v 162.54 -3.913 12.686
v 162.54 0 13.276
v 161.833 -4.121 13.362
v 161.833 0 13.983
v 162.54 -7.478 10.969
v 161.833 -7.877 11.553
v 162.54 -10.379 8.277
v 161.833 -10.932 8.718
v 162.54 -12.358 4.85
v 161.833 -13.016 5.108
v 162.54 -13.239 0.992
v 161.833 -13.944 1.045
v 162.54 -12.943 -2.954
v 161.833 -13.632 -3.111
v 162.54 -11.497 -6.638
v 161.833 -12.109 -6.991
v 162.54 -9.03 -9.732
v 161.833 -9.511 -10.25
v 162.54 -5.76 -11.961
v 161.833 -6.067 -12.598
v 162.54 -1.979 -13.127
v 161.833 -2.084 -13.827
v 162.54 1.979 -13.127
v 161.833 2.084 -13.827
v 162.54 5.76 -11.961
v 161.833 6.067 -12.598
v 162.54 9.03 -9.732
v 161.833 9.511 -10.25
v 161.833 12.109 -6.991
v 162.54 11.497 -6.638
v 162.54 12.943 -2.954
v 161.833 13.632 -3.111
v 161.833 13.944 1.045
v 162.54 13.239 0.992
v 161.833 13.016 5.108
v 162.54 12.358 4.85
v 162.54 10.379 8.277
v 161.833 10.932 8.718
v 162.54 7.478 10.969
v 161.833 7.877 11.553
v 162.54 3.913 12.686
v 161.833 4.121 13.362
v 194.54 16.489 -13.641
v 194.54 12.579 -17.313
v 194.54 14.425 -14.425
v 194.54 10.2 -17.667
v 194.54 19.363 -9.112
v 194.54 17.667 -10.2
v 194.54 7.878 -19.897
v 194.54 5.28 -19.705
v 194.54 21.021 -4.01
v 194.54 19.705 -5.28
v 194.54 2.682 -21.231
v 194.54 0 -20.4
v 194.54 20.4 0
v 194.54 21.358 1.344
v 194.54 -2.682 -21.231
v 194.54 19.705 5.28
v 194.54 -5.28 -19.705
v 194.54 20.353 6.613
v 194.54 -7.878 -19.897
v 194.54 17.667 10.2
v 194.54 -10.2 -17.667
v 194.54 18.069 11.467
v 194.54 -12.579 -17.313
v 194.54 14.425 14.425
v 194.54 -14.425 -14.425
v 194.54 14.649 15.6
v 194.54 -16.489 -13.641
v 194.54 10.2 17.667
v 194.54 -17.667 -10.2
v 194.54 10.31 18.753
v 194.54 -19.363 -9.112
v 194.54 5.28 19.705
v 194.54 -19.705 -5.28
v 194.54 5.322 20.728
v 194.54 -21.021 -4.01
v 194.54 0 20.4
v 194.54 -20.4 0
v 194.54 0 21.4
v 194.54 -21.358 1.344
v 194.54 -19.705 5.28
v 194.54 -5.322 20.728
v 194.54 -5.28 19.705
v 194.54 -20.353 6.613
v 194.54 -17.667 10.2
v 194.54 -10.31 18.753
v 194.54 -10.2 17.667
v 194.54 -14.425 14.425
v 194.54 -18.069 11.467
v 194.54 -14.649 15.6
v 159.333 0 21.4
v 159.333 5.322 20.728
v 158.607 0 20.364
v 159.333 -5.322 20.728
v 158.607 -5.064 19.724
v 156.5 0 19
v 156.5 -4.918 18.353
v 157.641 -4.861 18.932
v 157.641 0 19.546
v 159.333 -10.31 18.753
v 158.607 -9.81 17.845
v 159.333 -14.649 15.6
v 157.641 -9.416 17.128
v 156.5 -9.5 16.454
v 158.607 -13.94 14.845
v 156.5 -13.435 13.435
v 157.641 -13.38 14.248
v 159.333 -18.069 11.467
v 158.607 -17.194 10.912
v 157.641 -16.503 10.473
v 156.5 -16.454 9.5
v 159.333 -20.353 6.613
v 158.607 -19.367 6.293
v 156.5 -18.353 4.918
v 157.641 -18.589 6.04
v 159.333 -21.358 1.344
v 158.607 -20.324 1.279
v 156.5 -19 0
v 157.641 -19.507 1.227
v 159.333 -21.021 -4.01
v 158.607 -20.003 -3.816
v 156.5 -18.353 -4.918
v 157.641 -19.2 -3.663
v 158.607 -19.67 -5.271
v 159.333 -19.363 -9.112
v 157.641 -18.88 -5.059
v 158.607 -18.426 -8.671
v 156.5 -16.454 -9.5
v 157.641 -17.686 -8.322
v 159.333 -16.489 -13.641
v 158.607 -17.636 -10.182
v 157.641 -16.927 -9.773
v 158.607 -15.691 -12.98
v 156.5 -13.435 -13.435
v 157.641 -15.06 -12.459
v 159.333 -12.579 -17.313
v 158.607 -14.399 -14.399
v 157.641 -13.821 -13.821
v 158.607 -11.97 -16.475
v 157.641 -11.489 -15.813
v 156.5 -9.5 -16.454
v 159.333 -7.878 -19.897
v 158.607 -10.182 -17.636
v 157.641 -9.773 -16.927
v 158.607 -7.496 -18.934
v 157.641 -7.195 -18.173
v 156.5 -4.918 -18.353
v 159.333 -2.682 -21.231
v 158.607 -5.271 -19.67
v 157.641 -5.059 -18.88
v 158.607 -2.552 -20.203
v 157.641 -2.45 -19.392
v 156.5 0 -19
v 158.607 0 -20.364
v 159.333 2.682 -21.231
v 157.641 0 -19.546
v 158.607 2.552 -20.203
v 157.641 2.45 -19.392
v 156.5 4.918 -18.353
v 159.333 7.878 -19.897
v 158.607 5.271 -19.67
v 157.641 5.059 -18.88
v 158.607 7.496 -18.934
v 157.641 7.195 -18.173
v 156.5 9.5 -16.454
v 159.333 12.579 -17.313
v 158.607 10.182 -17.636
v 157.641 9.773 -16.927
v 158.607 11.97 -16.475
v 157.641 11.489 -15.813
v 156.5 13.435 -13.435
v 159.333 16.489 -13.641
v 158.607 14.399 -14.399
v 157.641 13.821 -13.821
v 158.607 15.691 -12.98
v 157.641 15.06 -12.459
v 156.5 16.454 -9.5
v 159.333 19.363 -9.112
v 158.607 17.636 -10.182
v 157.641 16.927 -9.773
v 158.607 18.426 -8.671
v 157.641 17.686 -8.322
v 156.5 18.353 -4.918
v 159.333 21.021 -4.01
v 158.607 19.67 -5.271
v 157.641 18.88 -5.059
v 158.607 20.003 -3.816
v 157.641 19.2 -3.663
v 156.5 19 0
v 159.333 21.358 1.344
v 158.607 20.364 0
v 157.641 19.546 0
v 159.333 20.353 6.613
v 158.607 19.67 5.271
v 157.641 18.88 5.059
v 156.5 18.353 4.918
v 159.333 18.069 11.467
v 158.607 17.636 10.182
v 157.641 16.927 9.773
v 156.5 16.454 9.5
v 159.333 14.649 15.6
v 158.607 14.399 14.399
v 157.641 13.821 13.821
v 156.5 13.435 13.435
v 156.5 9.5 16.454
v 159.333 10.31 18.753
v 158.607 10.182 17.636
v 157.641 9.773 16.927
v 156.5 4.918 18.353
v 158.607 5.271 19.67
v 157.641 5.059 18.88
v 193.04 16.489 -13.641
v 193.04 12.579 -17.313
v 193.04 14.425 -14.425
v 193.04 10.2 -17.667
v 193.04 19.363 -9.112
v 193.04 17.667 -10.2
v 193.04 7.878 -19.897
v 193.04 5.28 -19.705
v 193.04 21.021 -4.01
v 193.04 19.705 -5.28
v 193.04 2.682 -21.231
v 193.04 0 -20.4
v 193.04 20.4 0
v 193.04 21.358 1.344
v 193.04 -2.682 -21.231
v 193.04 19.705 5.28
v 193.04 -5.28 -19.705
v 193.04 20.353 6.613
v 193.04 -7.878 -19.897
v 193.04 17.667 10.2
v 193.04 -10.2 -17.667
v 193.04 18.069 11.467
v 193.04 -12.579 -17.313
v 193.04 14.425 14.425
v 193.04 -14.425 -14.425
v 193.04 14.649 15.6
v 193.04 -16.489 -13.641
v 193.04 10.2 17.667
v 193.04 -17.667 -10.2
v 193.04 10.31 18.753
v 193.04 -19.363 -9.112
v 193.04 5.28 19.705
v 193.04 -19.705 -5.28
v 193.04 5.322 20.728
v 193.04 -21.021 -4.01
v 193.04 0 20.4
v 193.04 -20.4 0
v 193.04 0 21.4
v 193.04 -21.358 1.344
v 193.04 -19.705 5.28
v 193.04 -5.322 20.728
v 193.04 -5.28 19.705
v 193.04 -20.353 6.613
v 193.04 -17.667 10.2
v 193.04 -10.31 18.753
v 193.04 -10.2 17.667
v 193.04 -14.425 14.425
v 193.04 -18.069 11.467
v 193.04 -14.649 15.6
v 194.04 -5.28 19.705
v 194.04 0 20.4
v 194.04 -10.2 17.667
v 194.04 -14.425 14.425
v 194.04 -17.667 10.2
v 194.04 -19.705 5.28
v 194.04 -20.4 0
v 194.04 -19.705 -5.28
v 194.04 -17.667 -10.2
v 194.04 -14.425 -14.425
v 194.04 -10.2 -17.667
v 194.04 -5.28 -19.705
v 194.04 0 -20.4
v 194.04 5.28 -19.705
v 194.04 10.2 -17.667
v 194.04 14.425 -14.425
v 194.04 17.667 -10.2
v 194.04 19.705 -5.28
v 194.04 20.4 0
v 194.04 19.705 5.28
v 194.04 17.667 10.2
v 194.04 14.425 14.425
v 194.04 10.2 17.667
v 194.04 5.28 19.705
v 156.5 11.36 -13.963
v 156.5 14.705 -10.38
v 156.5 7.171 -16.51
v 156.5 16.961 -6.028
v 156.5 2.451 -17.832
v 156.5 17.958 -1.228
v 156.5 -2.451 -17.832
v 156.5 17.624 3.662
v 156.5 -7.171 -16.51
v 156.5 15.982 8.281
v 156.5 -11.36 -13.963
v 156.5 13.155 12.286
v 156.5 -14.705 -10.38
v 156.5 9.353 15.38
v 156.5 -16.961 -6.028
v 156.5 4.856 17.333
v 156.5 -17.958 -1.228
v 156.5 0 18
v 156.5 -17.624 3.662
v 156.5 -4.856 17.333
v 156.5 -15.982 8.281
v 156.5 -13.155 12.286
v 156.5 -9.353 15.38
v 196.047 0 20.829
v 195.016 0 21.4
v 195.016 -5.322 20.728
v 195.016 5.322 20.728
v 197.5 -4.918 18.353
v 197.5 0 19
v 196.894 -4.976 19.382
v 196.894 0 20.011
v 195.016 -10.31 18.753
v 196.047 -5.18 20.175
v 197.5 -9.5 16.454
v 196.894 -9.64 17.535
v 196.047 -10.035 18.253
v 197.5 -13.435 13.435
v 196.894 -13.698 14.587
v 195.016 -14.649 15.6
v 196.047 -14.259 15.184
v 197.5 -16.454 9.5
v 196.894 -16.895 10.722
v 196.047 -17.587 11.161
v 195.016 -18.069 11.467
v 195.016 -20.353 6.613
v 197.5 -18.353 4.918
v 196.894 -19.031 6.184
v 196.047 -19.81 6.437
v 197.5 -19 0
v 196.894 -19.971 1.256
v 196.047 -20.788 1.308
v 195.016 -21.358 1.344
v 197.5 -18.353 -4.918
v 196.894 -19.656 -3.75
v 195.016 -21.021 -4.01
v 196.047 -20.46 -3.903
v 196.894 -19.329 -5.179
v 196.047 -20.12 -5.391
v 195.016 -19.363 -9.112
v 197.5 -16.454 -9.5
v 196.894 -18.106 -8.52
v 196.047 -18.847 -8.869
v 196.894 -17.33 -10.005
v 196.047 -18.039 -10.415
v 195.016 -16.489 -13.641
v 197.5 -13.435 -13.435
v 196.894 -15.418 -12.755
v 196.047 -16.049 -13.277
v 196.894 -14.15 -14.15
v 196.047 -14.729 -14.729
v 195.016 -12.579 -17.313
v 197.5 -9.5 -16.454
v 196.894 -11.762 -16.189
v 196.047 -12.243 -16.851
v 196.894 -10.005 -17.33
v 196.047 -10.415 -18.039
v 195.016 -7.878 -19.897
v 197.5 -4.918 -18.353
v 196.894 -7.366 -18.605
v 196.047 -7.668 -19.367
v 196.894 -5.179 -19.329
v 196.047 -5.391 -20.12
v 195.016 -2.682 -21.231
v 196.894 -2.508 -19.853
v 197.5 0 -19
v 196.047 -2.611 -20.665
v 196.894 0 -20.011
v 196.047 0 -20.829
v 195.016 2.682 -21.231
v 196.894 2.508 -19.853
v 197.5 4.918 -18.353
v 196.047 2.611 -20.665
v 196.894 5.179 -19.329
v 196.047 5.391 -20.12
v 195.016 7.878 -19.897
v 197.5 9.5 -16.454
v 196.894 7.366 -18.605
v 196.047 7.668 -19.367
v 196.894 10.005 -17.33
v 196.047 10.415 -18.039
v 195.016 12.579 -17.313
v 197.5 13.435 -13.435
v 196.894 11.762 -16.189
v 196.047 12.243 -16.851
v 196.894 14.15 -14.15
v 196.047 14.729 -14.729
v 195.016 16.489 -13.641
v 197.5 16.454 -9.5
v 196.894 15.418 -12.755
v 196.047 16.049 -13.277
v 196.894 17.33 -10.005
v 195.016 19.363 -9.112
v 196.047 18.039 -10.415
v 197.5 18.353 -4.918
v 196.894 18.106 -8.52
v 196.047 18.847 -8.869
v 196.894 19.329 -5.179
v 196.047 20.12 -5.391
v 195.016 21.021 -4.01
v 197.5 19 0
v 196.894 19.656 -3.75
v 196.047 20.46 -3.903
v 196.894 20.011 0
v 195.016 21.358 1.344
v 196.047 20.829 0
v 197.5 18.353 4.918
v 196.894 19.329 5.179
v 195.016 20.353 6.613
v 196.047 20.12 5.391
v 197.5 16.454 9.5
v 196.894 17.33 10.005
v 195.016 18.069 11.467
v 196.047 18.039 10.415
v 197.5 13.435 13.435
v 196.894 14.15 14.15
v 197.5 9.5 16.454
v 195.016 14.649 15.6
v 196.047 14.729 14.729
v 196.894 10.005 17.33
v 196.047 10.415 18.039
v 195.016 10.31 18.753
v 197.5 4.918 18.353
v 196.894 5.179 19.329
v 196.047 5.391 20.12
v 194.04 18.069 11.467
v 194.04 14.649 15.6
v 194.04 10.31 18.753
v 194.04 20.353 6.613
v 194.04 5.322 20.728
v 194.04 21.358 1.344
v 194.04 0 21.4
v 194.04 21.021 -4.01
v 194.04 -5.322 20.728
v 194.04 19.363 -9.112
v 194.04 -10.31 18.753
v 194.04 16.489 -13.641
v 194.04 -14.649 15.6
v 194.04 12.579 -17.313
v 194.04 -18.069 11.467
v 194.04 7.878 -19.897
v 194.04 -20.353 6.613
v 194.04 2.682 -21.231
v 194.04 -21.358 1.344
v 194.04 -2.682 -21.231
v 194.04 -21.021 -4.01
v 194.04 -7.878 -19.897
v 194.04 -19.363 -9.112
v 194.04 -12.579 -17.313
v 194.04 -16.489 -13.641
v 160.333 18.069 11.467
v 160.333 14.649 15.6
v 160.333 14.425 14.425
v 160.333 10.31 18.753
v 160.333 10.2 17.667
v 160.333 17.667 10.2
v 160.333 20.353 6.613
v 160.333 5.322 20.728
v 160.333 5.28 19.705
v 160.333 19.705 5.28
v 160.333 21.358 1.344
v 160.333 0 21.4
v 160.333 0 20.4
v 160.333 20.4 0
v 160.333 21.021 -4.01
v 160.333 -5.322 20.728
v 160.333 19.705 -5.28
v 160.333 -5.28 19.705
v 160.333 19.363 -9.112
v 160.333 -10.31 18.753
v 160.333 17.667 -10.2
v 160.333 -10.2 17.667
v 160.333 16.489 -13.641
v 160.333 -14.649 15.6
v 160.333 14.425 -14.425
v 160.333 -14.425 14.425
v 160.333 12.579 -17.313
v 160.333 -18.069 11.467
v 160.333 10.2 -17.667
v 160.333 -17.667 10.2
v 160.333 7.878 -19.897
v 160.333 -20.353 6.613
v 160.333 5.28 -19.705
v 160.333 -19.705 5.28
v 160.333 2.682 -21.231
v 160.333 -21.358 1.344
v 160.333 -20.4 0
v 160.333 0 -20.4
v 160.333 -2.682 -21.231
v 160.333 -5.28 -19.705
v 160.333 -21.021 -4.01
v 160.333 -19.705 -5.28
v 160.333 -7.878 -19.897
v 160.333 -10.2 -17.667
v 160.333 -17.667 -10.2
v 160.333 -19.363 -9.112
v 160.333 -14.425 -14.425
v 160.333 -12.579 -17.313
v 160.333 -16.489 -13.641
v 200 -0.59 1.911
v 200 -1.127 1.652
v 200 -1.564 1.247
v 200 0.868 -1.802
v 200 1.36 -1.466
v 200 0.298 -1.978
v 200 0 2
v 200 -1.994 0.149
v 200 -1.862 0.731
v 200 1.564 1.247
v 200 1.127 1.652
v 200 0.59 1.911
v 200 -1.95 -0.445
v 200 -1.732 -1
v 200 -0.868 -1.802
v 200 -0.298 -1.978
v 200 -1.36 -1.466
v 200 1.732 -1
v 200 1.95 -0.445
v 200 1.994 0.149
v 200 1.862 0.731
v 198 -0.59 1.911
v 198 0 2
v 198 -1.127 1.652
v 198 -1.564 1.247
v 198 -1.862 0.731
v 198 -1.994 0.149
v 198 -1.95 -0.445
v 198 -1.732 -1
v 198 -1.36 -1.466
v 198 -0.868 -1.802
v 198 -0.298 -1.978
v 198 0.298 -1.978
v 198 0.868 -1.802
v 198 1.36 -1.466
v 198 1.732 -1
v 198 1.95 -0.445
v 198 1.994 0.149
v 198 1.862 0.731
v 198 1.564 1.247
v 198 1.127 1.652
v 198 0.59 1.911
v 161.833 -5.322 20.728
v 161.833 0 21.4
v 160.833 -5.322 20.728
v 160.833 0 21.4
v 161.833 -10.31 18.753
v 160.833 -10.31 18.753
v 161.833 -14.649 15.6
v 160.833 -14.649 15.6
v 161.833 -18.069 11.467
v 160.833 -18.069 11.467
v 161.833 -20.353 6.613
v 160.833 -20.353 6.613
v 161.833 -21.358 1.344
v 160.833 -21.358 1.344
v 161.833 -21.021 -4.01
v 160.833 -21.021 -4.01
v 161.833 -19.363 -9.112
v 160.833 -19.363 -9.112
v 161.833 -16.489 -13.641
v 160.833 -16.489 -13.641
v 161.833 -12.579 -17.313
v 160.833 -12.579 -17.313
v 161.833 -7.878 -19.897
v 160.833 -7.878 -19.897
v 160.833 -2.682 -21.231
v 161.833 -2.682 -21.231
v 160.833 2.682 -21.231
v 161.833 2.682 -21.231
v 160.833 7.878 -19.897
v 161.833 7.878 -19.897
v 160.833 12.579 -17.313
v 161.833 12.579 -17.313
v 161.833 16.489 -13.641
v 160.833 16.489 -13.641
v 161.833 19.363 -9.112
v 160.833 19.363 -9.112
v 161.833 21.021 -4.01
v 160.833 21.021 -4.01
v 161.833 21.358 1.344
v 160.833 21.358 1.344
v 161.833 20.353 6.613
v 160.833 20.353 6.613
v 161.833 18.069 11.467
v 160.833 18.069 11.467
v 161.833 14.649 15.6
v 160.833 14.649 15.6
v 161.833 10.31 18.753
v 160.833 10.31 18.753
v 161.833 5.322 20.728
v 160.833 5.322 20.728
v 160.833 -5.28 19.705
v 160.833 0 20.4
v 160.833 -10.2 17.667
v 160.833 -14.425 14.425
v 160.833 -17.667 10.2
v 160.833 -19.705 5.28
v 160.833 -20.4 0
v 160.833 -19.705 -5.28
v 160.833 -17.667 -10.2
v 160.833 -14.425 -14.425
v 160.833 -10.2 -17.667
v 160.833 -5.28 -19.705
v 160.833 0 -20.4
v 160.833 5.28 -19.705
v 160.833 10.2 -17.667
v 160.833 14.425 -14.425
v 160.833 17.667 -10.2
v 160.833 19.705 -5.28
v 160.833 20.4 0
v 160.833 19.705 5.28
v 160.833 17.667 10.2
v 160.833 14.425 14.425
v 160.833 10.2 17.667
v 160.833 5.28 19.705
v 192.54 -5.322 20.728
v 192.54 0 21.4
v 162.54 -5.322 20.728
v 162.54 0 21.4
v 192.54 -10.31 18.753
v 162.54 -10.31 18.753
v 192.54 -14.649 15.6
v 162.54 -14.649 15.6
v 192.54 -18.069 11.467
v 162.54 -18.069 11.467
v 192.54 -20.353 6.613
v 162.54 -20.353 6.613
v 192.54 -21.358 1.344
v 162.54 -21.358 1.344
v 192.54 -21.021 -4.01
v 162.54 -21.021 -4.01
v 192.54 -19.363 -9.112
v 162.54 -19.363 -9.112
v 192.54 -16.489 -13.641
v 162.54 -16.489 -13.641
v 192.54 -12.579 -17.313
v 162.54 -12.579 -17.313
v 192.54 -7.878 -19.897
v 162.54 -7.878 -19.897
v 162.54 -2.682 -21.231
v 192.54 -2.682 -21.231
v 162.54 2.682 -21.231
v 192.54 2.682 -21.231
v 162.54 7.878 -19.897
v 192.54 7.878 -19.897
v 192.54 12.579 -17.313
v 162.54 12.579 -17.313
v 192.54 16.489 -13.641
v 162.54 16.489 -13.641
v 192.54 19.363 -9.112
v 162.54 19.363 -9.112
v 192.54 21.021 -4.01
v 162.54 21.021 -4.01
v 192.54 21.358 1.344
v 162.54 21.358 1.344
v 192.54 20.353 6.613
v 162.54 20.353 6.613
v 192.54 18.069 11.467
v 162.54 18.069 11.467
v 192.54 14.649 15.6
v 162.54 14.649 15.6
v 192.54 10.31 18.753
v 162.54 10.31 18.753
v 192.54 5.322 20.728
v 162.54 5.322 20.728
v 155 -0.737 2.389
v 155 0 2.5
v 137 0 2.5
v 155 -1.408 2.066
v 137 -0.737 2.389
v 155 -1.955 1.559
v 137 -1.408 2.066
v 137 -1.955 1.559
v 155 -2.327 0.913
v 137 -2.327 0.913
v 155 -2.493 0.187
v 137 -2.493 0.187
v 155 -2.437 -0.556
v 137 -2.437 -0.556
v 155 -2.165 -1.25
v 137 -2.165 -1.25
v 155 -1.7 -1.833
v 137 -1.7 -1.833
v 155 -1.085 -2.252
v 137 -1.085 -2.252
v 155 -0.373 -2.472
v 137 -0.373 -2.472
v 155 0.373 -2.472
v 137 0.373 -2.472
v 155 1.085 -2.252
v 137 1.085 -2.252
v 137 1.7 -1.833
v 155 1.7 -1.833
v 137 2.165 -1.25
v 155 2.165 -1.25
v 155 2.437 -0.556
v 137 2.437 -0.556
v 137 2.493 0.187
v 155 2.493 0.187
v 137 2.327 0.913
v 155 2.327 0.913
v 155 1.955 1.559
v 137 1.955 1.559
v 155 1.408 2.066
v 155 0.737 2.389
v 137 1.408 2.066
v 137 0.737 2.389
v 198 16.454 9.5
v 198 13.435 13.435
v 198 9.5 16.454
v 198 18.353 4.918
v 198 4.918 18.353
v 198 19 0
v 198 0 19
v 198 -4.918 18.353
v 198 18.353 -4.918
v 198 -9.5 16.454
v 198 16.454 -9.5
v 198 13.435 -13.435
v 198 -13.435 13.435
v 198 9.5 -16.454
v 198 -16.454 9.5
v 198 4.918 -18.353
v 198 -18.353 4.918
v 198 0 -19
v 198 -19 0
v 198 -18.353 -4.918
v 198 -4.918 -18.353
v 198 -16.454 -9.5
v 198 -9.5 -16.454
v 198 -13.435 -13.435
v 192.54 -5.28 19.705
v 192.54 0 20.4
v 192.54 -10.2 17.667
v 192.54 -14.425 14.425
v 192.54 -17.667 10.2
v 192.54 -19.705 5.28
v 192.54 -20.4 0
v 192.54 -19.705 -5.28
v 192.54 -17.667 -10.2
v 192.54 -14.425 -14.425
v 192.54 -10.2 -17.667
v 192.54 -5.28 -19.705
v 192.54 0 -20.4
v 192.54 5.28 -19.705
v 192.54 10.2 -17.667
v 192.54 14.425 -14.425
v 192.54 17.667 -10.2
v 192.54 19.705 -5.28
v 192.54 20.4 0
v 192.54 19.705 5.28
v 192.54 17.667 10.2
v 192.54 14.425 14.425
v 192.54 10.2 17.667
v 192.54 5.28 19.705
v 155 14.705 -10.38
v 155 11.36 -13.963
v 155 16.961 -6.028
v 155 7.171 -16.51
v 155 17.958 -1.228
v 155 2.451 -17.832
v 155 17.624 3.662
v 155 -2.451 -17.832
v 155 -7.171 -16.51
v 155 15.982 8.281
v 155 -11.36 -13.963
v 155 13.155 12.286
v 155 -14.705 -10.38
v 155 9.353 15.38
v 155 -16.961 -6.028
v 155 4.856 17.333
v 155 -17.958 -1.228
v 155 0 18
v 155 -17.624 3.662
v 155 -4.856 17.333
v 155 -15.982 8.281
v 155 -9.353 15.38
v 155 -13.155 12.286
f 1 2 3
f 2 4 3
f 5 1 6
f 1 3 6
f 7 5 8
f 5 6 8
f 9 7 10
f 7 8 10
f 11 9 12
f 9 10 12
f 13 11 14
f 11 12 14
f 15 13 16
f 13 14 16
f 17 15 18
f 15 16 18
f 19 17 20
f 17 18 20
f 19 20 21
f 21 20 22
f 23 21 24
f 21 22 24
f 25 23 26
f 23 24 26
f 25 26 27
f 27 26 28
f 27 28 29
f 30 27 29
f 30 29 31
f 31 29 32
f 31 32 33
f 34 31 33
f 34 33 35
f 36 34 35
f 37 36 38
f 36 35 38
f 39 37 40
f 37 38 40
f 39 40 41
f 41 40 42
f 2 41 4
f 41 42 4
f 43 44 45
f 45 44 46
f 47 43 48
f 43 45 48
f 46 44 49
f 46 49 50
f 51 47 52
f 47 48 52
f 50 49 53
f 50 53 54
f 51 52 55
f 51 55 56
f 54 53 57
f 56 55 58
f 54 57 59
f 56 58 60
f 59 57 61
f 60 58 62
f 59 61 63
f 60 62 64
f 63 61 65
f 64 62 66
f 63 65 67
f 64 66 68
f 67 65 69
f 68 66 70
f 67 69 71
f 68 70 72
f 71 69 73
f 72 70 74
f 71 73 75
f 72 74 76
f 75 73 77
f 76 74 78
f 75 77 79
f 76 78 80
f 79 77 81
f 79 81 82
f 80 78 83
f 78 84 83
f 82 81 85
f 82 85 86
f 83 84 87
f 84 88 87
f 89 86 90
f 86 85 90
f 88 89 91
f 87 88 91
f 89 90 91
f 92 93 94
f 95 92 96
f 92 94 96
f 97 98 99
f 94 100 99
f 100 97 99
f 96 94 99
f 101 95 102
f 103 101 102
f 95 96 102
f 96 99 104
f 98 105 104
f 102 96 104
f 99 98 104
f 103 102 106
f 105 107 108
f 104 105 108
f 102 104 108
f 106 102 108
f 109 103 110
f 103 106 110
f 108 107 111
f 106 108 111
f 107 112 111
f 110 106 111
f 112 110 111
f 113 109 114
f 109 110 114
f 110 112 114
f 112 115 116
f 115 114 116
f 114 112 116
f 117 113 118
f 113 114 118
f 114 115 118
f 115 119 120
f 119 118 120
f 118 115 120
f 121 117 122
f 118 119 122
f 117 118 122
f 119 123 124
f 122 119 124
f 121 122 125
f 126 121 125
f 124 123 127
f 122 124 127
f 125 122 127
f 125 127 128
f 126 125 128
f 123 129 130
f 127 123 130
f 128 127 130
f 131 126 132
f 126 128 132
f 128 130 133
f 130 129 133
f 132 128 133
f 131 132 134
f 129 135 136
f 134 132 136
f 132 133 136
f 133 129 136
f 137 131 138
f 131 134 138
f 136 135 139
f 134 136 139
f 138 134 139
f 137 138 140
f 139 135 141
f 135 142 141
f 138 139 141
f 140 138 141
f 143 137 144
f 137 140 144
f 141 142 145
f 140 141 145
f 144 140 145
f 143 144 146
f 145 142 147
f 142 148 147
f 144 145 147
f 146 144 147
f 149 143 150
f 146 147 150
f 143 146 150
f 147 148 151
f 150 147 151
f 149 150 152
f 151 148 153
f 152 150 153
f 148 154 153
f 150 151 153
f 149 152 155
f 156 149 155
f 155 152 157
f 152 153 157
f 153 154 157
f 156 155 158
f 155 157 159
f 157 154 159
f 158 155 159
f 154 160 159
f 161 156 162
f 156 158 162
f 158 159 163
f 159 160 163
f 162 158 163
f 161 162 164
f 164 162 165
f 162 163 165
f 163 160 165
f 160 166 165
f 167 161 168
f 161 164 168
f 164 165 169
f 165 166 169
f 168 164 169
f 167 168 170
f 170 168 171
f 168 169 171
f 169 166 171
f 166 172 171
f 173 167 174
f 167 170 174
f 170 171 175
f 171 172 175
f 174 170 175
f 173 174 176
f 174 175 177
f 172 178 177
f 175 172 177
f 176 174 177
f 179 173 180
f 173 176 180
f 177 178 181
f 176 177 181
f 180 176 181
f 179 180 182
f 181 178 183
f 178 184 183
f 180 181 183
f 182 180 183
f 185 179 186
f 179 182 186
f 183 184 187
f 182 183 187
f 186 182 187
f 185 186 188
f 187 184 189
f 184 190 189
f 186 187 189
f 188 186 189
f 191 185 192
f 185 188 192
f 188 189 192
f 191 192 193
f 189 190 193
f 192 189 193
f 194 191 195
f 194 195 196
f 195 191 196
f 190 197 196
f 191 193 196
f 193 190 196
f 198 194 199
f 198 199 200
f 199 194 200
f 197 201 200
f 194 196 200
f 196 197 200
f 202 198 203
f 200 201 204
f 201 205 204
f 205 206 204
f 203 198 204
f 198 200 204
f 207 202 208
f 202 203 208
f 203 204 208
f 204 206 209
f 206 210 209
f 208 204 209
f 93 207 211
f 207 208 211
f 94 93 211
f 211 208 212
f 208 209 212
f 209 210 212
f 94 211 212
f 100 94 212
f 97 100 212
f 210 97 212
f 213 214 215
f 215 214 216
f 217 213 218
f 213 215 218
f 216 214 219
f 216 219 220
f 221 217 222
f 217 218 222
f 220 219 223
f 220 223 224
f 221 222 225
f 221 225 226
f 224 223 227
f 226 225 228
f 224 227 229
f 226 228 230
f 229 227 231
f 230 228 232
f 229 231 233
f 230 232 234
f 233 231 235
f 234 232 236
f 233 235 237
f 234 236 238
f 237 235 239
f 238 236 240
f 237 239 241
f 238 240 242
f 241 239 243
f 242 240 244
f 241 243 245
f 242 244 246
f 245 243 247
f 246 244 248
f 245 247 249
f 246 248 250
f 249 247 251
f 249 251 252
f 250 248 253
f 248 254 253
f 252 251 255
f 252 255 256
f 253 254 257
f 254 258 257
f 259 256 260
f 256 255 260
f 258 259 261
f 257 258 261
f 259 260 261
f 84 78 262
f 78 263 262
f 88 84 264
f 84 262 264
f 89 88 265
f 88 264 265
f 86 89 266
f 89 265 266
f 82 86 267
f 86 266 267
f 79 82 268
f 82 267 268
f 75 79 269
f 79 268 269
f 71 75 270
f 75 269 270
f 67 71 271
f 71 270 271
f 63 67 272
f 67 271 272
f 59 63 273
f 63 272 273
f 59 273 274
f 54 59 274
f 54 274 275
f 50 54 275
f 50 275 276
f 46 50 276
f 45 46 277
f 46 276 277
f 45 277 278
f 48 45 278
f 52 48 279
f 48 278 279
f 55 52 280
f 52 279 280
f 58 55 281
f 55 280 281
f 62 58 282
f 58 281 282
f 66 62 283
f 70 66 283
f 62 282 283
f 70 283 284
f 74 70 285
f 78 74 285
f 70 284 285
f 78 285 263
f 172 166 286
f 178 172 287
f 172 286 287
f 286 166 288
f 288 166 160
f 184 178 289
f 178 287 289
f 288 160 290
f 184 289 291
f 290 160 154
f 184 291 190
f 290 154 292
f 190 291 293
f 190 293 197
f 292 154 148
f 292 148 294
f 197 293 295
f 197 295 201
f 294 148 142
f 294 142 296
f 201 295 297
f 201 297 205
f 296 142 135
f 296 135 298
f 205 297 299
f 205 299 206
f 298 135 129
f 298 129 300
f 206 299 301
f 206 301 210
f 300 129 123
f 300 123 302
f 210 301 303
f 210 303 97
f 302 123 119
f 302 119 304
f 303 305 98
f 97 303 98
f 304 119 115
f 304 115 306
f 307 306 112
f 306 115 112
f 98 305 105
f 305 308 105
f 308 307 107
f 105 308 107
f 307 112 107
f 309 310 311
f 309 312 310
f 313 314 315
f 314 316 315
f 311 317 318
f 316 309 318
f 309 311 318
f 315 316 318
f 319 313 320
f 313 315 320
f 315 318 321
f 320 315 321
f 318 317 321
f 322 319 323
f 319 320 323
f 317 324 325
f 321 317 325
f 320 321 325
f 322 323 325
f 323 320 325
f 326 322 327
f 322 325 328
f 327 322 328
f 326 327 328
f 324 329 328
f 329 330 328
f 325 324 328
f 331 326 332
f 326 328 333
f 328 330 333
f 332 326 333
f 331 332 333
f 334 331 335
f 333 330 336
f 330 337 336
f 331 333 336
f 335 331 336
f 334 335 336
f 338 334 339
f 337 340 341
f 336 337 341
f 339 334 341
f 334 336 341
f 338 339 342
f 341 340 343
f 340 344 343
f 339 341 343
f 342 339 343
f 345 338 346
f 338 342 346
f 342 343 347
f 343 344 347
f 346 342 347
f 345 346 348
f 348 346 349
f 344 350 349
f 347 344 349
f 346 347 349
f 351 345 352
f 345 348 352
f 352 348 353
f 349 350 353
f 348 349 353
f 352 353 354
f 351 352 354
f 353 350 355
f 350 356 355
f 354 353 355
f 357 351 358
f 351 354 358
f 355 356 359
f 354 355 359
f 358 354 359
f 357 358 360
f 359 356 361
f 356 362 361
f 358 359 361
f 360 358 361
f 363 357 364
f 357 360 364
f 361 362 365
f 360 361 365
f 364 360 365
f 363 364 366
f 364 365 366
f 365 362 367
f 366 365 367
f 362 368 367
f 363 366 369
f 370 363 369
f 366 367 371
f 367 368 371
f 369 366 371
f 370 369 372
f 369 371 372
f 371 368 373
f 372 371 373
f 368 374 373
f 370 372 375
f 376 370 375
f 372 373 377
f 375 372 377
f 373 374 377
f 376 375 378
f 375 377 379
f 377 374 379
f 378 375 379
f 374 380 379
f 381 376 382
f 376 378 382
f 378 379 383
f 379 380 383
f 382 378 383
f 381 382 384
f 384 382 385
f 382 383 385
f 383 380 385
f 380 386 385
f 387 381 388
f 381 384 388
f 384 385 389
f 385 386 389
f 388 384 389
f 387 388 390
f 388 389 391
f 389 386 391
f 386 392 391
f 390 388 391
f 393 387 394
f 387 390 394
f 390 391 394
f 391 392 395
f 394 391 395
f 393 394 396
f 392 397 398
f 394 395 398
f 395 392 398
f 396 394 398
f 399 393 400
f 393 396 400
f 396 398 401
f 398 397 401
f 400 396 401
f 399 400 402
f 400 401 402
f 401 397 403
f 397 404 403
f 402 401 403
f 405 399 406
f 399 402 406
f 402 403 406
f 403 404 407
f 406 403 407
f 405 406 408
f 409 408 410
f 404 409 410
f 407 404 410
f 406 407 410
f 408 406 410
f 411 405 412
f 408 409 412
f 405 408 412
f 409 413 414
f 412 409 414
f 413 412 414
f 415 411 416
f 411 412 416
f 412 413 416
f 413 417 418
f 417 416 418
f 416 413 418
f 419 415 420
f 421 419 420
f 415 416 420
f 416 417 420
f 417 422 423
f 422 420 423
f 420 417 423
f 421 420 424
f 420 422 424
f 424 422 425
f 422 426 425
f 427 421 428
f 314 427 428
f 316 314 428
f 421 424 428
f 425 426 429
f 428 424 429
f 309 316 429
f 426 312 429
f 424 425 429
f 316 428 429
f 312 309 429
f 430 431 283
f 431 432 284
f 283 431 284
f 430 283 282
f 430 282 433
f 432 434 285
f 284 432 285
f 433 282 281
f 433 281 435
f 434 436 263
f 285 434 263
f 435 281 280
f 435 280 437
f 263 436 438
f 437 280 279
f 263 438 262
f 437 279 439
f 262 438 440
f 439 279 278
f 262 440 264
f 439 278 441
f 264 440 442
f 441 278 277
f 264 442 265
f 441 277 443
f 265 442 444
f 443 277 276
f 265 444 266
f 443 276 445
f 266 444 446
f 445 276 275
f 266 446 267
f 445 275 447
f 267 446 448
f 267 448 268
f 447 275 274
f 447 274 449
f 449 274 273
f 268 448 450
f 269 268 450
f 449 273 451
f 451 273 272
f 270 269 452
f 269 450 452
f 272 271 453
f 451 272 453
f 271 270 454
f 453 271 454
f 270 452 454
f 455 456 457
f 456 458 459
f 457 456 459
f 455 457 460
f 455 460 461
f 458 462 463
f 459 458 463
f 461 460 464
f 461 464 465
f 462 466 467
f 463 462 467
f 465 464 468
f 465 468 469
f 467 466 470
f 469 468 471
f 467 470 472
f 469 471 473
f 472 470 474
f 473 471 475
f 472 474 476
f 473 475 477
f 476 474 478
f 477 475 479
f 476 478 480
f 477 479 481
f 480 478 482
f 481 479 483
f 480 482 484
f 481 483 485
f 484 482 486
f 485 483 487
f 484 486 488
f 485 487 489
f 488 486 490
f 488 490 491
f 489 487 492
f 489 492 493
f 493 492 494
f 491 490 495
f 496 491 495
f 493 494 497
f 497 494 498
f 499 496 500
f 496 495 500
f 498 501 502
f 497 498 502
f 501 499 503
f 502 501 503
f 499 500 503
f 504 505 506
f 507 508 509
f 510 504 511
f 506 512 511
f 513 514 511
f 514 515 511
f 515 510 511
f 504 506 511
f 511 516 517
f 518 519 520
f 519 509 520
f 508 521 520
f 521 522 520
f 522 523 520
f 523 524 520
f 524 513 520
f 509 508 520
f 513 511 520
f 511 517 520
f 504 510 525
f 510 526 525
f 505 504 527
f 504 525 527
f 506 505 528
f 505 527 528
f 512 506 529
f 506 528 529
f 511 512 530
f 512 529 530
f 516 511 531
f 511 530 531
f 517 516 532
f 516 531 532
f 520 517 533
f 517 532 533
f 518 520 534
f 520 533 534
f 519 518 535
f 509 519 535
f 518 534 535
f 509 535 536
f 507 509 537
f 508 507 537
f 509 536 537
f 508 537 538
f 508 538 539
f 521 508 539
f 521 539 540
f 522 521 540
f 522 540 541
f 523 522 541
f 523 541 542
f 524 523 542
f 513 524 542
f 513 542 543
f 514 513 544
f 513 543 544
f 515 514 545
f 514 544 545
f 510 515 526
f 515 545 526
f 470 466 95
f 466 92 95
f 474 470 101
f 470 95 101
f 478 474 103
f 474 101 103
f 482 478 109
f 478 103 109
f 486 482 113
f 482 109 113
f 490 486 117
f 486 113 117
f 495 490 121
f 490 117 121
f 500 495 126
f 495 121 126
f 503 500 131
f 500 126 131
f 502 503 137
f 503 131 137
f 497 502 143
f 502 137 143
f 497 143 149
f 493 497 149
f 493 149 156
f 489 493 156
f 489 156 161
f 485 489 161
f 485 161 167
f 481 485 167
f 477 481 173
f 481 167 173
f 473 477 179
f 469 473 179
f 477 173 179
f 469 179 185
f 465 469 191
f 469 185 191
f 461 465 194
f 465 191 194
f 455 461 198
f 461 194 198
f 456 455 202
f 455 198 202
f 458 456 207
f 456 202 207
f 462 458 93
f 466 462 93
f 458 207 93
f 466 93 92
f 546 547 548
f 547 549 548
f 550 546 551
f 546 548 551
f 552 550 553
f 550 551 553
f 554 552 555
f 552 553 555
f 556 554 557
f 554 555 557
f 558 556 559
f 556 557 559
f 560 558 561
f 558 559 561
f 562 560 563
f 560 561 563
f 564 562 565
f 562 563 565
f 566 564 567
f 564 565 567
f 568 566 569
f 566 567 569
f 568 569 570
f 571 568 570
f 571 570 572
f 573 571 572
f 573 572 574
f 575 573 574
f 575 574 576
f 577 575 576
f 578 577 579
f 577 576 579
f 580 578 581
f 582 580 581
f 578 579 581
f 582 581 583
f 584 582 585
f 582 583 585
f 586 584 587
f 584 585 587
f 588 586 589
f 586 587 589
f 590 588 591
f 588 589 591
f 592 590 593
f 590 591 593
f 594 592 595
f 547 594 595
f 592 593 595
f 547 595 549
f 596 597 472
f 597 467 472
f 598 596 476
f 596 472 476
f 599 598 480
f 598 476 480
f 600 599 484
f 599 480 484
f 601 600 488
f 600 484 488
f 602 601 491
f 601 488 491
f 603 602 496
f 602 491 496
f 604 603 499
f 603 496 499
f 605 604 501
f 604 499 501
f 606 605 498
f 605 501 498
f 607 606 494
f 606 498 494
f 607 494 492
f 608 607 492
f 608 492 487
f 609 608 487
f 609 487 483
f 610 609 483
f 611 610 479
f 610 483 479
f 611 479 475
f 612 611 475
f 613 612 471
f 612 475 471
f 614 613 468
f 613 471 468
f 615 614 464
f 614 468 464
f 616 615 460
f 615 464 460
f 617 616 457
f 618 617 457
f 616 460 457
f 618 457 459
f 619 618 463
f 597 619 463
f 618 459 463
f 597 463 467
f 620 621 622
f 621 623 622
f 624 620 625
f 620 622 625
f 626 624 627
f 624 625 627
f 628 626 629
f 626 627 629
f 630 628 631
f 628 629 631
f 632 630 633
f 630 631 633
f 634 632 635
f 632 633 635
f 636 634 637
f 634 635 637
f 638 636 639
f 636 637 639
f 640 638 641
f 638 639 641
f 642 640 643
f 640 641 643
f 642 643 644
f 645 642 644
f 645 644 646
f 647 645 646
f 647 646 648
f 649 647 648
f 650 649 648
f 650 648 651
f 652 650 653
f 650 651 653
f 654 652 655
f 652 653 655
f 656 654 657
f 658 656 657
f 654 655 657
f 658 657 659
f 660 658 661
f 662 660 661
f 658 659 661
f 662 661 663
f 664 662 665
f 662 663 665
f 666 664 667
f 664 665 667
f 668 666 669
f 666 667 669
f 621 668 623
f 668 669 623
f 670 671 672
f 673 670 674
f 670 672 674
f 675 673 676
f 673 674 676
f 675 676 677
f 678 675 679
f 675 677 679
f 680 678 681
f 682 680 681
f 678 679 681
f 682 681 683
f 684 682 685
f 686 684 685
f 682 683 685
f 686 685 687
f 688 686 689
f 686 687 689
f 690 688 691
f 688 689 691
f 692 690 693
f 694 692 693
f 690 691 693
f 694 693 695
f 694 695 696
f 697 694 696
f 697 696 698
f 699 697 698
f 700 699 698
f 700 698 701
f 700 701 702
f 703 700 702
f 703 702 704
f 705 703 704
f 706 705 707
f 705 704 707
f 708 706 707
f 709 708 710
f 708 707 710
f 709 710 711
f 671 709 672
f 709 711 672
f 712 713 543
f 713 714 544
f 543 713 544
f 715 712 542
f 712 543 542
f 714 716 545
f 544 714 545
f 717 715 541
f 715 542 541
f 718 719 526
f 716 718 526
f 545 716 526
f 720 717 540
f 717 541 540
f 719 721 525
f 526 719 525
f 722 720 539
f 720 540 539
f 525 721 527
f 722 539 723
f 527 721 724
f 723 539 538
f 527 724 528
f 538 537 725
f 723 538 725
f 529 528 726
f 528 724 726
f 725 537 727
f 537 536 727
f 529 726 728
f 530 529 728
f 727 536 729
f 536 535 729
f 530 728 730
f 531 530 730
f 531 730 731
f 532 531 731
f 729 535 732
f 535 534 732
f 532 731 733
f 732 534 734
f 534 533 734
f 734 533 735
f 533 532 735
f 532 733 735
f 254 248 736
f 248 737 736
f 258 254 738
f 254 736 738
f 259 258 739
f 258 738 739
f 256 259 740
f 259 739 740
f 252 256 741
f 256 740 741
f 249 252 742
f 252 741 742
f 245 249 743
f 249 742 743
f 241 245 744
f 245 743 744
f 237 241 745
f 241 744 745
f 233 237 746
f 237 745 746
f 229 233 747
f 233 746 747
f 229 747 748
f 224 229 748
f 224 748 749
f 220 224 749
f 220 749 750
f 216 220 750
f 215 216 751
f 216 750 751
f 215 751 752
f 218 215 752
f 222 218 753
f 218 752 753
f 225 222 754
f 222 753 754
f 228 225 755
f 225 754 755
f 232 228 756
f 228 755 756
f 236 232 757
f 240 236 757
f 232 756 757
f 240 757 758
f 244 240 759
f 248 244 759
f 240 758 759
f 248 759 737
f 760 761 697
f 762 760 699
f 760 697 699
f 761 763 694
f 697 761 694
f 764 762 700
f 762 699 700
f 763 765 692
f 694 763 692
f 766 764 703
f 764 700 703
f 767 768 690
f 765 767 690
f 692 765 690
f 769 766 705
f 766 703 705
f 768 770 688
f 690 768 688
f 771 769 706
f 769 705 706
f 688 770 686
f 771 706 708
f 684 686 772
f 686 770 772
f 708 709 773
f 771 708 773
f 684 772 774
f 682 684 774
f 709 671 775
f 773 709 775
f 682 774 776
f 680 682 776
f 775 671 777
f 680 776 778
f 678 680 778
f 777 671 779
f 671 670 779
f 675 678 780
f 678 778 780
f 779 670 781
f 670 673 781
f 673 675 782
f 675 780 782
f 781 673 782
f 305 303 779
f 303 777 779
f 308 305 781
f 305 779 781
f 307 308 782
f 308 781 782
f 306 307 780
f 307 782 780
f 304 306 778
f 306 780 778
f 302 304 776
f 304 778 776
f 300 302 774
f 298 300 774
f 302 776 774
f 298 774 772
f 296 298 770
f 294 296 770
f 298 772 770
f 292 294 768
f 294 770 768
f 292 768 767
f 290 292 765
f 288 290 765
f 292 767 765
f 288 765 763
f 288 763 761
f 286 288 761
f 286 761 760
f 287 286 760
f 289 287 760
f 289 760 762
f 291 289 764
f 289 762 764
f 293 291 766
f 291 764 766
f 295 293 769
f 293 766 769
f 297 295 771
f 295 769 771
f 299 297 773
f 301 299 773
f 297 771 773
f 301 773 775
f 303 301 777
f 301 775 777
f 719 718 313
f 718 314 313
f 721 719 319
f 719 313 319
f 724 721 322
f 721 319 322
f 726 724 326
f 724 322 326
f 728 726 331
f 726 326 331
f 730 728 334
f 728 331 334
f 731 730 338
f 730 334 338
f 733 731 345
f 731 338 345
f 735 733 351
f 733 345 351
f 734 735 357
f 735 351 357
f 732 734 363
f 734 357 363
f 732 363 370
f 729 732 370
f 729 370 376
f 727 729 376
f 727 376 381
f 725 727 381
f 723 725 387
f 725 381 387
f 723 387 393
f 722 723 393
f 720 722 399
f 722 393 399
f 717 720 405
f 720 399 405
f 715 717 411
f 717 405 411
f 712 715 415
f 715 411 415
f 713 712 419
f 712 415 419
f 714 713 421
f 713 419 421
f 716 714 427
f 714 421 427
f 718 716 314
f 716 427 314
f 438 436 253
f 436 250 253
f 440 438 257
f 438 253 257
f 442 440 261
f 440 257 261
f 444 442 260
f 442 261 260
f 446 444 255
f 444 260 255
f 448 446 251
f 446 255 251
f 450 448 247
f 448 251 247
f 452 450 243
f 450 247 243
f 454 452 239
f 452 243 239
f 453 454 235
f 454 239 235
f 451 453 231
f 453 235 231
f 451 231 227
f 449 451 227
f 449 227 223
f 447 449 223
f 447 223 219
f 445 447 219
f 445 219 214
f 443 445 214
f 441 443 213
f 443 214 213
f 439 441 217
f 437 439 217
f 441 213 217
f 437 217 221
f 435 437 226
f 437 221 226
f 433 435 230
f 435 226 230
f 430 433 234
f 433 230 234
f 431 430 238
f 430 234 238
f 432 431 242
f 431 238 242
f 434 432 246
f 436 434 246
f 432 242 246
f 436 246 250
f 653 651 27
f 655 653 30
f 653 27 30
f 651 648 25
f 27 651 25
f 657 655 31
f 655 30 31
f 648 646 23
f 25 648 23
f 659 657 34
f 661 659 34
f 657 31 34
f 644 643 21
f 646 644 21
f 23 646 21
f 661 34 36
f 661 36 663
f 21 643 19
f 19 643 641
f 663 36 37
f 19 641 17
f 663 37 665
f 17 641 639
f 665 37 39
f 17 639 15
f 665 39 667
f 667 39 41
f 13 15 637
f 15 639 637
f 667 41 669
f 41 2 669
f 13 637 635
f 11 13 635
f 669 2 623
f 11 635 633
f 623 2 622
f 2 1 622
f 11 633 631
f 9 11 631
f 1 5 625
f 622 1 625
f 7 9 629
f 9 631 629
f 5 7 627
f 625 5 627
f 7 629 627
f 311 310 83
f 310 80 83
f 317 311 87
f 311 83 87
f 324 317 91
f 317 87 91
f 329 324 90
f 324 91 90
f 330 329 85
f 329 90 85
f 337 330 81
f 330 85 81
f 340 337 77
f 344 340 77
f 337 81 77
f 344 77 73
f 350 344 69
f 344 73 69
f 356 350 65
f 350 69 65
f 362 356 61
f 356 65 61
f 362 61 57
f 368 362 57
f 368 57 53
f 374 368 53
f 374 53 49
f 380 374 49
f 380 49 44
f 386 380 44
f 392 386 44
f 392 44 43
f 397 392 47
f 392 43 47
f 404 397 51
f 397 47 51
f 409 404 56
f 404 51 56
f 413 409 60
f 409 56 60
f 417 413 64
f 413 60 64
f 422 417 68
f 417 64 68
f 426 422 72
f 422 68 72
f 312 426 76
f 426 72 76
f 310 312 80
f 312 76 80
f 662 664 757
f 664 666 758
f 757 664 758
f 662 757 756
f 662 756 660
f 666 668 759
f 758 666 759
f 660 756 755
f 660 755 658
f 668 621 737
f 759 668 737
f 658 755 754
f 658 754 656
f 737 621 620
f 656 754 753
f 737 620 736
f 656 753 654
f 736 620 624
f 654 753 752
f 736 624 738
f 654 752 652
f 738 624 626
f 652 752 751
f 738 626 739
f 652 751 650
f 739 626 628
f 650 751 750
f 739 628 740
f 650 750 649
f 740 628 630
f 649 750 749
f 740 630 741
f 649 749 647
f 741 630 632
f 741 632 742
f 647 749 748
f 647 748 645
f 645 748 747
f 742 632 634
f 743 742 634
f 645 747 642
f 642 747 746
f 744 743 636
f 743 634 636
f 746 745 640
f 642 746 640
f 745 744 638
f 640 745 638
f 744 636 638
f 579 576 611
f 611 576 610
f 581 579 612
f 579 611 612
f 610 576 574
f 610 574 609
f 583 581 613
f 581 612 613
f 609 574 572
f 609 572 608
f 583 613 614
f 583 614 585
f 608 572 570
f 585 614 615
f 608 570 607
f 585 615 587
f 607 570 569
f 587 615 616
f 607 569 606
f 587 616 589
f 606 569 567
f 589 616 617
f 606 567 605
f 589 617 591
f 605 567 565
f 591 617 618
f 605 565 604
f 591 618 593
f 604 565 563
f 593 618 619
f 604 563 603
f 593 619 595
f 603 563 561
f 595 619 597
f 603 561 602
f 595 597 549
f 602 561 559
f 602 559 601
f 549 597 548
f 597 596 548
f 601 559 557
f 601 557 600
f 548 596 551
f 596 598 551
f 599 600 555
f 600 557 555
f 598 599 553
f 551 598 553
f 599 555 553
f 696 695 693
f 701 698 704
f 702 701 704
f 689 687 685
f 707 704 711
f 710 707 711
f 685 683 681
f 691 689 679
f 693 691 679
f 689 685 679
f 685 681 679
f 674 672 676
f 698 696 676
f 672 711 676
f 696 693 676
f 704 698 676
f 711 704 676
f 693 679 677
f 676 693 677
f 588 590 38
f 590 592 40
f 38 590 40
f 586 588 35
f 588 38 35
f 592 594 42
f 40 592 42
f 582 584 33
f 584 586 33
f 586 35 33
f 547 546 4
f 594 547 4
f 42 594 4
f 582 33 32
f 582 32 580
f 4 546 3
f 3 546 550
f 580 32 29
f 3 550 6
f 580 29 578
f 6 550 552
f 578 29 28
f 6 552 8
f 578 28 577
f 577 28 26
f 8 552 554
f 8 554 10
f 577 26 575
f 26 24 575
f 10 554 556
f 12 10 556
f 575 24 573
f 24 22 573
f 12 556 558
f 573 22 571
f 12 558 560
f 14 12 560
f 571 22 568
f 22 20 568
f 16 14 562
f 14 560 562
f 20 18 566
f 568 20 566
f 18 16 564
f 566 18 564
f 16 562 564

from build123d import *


with BuildPart() as part:
    # Sketch6 → Revolve1 (revolve)
    with BuildSketch(Plane.XY, mode=Mode.PRIVATE) as revolve1_sk:
        with BuildLine():
            Line((137, 2.5), (137, 0))
            Line((137, 0), (155, 0))
            Line((155, 0), (161.832507571, 0))
            Line((161.832507571, 0), (161.832507571, 13.982740363))
            Line((161.832507571, 13.982740363), (161.832507571, 21.4))
            Line((161.832507571, 21.4), (160.832507571, 21.4))
            Line((160.832507571, 21.4), (160.832507571, 20.4))
            Line((160.832507571, 20.4), (160.332507571, 20.4))
            Line((160.332507571, 20.4), (160.332507571, 21.4))
            Line((160.332507571, 21.4), (159.332507571, 21.4))
            ThreePointArc((159.332507571, 21.4), (158.150175861, 19.923922479), (156.5, 19))
            Line((156.5, 19), (156.5, 18))
            Line((156.5, 18), (155, 18))
            Line((155, 18), (155, 2.5))
            Line((155, 2.5), (137, 2.5))
        make_face()
        Polygon((161.832507571, 13.982740363), (161.832507571, 0), (162.539614352, 0), (162.539614352, 13.275633582), align=None)
        with BuildLine():
            Line((162.539614352, 13.275633582), (162.539614352, 0))
            Line((162.539614352, 0), (200, 0))
            Line((200, 0), (200, 2))
            Line((200, 2), (198, 2))
            Line((198, 2), (198, 19))
            Line((198, 19), (197.5, 19))
            ThreePointArc((197.5, 19), (196.497546245, 20.44777704), (195.016248395, 21.4))
            Line((195.016248395, 21.4), (194.539614352, 21.4))
            Line((194.539614352, 21.4), (194.539614352, 20.4))
            Line((194.539614352, 20.4), (194.039614352, 20.4))
            Line((194.039614352, 20.4), (194.039614352, 21.4))
            Line((194.039614352, 21.4), (193.039614352, 21.4))
            Line((193.039614352, 21.4), (193.039614352, 20.4))
            Line((193.039614352, 20.4), (192.539614352, 20.4))
            Line((192.539614352, 20.4), (192.539614352, 21.4))
            Line((192.539614352, 21.4), (162.539614352, 21.4))
            Line((162.539614352, 21.4), (162.539614352, 13.275633582))
        make_face()
    revolve(revolve1_sk.sketch.rotate(Axis((0, 0, 0), (1, 0, 0)), 90), axis=Axis((0, 0, 0), (1, 0, 0)))


solid = part.part
